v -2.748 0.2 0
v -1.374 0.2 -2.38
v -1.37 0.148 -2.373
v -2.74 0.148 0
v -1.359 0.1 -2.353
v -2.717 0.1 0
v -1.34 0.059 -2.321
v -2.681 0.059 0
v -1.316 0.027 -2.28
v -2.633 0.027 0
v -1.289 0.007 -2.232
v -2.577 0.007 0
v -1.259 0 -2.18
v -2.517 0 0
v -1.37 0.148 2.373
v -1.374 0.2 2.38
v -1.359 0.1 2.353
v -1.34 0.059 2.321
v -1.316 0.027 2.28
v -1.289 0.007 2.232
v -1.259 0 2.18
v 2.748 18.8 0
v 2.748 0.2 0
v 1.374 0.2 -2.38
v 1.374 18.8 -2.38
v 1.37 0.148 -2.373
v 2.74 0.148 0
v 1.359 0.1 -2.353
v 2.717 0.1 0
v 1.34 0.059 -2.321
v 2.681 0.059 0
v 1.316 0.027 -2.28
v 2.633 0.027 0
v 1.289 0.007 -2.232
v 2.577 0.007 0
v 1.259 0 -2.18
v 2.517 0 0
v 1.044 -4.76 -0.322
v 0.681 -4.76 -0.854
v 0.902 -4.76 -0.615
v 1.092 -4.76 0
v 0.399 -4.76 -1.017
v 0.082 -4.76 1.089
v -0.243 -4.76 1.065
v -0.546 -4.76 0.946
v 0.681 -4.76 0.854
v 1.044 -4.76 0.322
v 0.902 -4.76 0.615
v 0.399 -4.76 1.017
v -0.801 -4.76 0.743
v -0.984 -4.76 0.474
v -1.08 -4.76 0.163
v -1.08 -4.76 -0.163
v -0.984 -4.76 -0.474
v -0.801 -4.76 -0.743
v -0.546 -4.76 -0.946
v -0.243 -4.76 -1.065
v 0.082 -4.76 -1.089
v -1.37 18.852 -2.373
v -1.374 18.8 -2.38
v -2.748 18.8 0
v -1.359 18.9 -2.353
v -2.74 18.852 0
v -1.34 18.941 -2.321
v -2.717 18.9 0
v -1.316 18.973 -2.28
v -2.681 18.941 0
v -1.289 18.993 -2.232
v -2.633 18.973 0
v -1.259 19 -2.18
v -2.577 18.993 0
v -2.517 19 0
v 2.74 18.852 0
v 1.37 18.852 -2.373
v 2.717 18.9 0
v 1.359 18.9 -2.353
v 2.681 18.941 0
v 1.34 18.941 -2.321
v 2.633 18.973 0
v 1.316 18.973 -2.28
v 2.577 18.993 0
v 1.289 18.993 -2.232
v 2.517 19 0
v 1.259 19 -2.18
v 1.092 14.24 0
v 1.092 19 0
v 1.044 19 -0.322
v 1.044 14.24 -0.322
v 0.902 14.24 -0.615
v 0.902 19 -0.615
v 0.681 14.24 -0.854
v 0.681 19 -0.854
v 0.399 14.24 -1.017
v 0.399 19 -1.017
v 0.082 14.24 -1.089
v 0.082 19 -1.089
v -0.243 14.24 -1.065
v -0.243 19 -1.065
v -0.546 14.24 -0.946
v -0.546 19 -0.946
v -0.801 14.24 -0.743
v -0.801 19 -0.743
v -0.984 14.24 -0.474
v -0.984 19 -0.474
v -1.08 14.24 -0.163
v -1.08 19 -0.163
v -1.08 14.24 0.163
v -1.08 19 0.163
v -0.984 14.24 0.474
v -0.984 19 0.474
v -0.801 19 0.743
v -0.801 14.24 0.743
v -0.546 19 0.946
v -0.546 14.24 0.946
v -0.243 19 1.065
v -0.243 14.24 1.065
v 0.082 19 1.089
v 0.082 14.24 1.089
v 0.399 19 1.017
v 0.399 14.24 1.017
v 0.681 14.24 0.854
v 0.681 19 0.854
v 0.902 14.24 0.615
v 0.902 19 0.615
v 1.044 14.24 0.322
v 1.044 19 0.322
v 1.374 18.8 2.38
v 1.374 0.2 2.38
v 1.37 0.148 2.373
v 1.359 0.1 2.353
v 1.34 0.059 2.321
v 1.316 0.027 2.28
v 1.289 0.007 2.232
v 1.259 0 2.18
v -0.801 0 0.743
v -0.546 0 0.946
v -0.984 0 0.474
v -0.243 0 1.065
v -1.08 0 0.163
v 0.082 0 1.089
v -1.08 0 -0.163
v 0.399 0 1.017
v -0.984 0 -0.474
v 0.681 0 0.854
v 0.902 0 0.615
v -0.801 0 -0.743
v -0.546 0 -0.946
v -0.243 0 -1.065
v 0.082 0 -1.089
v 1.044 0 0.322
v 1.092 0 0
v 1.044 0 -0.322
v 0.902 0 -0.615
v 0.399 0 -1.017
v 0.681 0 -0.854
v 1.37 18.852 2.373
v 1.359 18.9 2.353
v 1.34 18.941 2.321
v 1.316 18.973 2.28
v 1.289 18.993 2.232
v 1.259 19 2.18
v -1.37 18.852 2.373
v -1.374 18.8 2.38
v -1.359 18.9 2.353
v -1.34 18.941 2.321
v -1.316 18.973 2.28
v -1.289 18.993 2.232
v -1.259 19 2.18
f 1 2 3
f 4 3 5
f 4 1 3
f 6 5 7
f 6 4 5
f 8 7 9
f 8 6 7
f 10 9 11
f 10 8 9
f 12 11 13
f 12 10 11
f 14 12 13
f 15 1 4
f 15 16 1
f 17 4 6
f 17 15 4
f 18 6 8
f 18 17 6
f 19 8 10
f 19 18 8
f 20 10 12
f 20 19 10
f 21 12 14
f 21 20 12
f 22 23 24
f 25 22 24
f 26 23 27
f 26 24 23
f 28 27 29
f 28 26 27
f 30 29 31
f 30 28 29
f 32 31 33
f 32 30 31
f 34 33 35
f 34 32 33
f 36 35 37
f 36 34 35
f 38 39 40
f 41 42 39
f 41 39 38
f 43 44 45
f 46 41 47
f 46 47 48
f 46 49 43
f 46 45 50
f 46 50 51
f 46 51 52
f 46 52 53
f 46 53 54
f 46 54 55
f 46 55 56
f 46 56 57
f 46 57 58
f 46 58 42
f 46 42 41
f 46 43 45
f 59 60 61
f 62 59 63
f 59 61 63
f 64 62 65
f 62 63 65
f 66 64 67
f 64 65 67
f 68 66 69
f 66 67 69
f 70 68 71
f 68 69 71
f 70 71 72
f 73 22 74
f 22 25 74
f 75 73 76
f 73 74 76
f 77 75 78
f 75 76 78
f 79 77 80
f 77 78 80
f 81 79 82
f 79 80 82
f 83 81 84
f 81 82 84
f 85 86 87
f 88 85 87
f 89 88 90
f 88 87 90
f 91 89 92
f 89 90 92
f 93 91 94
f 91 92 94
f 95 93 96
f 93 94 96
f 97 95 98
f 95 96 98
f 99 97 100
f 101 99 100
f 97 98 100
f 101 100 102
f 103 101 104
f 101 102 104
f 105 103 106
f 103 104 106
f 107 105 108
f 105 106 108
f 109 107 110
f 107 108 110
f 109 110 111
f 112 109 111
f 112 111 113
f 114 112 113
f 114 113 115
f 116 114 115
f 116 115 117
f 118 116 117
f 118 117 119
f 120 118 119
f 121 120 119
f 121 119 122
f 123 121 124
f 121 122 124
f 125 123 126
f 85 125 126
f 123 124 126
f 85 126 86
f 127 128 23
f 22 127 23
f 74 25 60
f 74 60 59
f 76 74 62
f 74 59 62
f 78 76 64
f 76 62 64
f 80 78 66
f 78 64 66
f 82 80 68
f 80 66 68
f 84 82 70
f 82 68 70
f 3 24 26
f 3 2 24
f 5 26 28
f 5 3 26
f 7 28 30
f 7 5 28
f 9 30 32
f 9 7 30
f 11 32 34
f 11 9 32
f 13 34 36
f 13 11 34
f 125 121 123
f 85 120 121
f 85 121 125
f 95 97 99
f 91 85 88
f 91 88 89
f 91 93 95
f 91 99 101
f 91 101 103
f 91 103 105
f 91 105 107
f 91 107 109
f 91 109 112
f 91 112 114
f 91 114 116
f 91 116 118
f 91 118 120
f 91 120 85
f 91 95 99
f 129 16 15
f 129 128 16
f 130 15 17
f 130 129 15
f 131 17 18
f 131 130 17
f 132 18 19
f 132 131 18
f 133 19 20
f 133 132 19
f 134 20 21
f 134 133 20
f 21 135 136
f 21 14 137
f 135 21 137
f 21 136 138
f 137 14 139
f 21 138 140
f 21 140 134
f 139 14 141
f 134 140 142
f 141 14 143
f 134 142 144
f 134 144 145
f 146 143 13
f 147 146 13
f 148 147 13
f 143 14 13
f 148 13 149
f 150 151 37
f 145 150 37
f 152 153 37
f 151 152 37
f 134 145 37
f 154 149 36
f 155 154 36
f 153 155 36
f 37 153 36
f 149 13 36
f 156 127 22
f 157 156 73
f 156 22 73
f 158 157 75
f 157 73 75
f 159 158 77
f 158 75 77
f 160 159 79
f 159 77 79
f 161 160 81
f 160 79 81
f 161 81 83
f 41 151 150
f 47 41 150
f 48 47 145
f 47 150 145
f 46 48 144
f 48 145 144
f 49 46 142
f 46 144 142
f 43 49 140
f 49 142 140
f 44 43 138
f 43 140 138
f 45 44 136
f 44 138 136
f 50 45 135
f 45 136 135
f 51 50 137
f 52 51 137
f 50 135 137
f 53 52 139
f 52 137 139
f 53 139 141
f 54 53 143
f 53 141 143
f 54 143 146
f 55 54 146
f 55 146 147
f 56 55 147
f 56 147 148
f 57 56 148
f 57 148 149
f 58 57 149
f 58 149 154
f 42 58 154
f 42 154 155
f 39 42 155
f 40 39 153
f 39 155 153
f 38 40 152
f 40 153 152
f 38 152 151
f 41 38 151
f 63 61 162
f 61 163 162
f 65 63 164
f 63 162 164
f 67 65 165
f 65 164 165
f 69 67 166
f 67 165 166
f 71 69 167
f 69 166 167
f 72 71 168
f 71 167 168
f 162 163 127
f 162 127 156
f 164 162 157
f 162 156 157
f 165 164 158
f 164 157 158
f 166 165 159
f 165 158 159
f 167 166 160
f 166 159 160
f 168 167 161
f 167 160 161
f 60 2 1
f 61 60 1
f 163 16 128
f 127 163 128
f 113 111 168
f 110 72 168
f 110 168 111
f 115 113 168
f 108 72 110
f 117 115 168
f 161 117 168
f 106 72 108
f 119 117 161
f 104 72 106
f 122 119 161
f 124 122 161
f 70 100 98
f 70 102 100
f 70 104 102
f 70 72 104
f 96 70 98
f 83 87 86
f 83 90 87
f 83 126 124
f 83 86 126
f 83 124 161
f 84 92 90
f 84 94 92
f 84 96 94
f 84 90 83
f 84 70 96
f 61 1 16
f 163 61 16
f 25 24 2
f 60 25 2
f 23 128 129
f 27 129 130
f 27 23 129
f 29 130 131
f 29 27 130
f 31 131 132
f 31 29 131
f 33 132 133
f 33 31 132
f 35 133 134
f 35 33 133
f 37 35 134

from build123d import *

# Parameters (mm, degrees)
RESSALTO_EXTRUS_O1_DEPTH = 19
FILETE1_R                = 0.2
ESBO_O2_R                = 1.0922
RESSALTO_EXTRUS_O2_DEPTH = 4.76
ESBO_O3_R                = 1.0922
CORTE_EXTRUS_O1_DEPTH    = 4.76


with BuildPart() as part:
    # Esboço1 → Ressalto-extrusão1 (new body)
    with BuildSketch(Plane(origin=(0, 0, 0), x_dir=(1, 0, 0), z_dir=(0, 1, 0))):
        Polygon((2.748187281, 0), (1.374093641, 2.38), (-1.374093641, 2.38), (-2.748187281, 0), (-1.374093641, -2.38), (1.374093641, -2.38), align=None)
    extrude(amount=RESSALTO_EXTRUS_O1_DEPTH)

    # Filete1
    filete1_edges = [part.edges().sort_by_distance(p)[0] for p in [
        (0, 19, -2.38),
        (-2.061140461, 19, -1.19),
        (-2.061140461, 19, 1.19),
        (0, 19, 2.38),
        (2.061140461, 19, 1.19),
        (0, 0, 2.38),
        (-2.061140461, 0, 1.19),
        (-2.061140461, 0, -1.19),
        (2.061140461, 19, -1.19),
        (0, 0, -2.38),
        (2.061140461, 0, -1.19),
        (2.061140461, 0, 1.19),
    ]]
    fillet(filete1_edges, radius=FILETE1_R)

    # Esboço2 → Ressalto-extrusão2 (add)
    with BuildSketch(Plane.XZ):
        Circle(ESBO_O2_R)
    extrude(amount=RESSALTO_EXTRUS_O2_DEPTH)

    # Esboço3 → Corte-extrusão1 (cut)
    with BuildSketch(Plane(origin=(0, 19, 0), x_dir=(1, 0, 0), z_dir=(0, 1, 0))):
        Circle(ESBO_O3_R)
    extrude(amount=-CORTE_EXTRUS_O1_DEPTH, mode=Mode.SUBTRACT)


solid = part.part
